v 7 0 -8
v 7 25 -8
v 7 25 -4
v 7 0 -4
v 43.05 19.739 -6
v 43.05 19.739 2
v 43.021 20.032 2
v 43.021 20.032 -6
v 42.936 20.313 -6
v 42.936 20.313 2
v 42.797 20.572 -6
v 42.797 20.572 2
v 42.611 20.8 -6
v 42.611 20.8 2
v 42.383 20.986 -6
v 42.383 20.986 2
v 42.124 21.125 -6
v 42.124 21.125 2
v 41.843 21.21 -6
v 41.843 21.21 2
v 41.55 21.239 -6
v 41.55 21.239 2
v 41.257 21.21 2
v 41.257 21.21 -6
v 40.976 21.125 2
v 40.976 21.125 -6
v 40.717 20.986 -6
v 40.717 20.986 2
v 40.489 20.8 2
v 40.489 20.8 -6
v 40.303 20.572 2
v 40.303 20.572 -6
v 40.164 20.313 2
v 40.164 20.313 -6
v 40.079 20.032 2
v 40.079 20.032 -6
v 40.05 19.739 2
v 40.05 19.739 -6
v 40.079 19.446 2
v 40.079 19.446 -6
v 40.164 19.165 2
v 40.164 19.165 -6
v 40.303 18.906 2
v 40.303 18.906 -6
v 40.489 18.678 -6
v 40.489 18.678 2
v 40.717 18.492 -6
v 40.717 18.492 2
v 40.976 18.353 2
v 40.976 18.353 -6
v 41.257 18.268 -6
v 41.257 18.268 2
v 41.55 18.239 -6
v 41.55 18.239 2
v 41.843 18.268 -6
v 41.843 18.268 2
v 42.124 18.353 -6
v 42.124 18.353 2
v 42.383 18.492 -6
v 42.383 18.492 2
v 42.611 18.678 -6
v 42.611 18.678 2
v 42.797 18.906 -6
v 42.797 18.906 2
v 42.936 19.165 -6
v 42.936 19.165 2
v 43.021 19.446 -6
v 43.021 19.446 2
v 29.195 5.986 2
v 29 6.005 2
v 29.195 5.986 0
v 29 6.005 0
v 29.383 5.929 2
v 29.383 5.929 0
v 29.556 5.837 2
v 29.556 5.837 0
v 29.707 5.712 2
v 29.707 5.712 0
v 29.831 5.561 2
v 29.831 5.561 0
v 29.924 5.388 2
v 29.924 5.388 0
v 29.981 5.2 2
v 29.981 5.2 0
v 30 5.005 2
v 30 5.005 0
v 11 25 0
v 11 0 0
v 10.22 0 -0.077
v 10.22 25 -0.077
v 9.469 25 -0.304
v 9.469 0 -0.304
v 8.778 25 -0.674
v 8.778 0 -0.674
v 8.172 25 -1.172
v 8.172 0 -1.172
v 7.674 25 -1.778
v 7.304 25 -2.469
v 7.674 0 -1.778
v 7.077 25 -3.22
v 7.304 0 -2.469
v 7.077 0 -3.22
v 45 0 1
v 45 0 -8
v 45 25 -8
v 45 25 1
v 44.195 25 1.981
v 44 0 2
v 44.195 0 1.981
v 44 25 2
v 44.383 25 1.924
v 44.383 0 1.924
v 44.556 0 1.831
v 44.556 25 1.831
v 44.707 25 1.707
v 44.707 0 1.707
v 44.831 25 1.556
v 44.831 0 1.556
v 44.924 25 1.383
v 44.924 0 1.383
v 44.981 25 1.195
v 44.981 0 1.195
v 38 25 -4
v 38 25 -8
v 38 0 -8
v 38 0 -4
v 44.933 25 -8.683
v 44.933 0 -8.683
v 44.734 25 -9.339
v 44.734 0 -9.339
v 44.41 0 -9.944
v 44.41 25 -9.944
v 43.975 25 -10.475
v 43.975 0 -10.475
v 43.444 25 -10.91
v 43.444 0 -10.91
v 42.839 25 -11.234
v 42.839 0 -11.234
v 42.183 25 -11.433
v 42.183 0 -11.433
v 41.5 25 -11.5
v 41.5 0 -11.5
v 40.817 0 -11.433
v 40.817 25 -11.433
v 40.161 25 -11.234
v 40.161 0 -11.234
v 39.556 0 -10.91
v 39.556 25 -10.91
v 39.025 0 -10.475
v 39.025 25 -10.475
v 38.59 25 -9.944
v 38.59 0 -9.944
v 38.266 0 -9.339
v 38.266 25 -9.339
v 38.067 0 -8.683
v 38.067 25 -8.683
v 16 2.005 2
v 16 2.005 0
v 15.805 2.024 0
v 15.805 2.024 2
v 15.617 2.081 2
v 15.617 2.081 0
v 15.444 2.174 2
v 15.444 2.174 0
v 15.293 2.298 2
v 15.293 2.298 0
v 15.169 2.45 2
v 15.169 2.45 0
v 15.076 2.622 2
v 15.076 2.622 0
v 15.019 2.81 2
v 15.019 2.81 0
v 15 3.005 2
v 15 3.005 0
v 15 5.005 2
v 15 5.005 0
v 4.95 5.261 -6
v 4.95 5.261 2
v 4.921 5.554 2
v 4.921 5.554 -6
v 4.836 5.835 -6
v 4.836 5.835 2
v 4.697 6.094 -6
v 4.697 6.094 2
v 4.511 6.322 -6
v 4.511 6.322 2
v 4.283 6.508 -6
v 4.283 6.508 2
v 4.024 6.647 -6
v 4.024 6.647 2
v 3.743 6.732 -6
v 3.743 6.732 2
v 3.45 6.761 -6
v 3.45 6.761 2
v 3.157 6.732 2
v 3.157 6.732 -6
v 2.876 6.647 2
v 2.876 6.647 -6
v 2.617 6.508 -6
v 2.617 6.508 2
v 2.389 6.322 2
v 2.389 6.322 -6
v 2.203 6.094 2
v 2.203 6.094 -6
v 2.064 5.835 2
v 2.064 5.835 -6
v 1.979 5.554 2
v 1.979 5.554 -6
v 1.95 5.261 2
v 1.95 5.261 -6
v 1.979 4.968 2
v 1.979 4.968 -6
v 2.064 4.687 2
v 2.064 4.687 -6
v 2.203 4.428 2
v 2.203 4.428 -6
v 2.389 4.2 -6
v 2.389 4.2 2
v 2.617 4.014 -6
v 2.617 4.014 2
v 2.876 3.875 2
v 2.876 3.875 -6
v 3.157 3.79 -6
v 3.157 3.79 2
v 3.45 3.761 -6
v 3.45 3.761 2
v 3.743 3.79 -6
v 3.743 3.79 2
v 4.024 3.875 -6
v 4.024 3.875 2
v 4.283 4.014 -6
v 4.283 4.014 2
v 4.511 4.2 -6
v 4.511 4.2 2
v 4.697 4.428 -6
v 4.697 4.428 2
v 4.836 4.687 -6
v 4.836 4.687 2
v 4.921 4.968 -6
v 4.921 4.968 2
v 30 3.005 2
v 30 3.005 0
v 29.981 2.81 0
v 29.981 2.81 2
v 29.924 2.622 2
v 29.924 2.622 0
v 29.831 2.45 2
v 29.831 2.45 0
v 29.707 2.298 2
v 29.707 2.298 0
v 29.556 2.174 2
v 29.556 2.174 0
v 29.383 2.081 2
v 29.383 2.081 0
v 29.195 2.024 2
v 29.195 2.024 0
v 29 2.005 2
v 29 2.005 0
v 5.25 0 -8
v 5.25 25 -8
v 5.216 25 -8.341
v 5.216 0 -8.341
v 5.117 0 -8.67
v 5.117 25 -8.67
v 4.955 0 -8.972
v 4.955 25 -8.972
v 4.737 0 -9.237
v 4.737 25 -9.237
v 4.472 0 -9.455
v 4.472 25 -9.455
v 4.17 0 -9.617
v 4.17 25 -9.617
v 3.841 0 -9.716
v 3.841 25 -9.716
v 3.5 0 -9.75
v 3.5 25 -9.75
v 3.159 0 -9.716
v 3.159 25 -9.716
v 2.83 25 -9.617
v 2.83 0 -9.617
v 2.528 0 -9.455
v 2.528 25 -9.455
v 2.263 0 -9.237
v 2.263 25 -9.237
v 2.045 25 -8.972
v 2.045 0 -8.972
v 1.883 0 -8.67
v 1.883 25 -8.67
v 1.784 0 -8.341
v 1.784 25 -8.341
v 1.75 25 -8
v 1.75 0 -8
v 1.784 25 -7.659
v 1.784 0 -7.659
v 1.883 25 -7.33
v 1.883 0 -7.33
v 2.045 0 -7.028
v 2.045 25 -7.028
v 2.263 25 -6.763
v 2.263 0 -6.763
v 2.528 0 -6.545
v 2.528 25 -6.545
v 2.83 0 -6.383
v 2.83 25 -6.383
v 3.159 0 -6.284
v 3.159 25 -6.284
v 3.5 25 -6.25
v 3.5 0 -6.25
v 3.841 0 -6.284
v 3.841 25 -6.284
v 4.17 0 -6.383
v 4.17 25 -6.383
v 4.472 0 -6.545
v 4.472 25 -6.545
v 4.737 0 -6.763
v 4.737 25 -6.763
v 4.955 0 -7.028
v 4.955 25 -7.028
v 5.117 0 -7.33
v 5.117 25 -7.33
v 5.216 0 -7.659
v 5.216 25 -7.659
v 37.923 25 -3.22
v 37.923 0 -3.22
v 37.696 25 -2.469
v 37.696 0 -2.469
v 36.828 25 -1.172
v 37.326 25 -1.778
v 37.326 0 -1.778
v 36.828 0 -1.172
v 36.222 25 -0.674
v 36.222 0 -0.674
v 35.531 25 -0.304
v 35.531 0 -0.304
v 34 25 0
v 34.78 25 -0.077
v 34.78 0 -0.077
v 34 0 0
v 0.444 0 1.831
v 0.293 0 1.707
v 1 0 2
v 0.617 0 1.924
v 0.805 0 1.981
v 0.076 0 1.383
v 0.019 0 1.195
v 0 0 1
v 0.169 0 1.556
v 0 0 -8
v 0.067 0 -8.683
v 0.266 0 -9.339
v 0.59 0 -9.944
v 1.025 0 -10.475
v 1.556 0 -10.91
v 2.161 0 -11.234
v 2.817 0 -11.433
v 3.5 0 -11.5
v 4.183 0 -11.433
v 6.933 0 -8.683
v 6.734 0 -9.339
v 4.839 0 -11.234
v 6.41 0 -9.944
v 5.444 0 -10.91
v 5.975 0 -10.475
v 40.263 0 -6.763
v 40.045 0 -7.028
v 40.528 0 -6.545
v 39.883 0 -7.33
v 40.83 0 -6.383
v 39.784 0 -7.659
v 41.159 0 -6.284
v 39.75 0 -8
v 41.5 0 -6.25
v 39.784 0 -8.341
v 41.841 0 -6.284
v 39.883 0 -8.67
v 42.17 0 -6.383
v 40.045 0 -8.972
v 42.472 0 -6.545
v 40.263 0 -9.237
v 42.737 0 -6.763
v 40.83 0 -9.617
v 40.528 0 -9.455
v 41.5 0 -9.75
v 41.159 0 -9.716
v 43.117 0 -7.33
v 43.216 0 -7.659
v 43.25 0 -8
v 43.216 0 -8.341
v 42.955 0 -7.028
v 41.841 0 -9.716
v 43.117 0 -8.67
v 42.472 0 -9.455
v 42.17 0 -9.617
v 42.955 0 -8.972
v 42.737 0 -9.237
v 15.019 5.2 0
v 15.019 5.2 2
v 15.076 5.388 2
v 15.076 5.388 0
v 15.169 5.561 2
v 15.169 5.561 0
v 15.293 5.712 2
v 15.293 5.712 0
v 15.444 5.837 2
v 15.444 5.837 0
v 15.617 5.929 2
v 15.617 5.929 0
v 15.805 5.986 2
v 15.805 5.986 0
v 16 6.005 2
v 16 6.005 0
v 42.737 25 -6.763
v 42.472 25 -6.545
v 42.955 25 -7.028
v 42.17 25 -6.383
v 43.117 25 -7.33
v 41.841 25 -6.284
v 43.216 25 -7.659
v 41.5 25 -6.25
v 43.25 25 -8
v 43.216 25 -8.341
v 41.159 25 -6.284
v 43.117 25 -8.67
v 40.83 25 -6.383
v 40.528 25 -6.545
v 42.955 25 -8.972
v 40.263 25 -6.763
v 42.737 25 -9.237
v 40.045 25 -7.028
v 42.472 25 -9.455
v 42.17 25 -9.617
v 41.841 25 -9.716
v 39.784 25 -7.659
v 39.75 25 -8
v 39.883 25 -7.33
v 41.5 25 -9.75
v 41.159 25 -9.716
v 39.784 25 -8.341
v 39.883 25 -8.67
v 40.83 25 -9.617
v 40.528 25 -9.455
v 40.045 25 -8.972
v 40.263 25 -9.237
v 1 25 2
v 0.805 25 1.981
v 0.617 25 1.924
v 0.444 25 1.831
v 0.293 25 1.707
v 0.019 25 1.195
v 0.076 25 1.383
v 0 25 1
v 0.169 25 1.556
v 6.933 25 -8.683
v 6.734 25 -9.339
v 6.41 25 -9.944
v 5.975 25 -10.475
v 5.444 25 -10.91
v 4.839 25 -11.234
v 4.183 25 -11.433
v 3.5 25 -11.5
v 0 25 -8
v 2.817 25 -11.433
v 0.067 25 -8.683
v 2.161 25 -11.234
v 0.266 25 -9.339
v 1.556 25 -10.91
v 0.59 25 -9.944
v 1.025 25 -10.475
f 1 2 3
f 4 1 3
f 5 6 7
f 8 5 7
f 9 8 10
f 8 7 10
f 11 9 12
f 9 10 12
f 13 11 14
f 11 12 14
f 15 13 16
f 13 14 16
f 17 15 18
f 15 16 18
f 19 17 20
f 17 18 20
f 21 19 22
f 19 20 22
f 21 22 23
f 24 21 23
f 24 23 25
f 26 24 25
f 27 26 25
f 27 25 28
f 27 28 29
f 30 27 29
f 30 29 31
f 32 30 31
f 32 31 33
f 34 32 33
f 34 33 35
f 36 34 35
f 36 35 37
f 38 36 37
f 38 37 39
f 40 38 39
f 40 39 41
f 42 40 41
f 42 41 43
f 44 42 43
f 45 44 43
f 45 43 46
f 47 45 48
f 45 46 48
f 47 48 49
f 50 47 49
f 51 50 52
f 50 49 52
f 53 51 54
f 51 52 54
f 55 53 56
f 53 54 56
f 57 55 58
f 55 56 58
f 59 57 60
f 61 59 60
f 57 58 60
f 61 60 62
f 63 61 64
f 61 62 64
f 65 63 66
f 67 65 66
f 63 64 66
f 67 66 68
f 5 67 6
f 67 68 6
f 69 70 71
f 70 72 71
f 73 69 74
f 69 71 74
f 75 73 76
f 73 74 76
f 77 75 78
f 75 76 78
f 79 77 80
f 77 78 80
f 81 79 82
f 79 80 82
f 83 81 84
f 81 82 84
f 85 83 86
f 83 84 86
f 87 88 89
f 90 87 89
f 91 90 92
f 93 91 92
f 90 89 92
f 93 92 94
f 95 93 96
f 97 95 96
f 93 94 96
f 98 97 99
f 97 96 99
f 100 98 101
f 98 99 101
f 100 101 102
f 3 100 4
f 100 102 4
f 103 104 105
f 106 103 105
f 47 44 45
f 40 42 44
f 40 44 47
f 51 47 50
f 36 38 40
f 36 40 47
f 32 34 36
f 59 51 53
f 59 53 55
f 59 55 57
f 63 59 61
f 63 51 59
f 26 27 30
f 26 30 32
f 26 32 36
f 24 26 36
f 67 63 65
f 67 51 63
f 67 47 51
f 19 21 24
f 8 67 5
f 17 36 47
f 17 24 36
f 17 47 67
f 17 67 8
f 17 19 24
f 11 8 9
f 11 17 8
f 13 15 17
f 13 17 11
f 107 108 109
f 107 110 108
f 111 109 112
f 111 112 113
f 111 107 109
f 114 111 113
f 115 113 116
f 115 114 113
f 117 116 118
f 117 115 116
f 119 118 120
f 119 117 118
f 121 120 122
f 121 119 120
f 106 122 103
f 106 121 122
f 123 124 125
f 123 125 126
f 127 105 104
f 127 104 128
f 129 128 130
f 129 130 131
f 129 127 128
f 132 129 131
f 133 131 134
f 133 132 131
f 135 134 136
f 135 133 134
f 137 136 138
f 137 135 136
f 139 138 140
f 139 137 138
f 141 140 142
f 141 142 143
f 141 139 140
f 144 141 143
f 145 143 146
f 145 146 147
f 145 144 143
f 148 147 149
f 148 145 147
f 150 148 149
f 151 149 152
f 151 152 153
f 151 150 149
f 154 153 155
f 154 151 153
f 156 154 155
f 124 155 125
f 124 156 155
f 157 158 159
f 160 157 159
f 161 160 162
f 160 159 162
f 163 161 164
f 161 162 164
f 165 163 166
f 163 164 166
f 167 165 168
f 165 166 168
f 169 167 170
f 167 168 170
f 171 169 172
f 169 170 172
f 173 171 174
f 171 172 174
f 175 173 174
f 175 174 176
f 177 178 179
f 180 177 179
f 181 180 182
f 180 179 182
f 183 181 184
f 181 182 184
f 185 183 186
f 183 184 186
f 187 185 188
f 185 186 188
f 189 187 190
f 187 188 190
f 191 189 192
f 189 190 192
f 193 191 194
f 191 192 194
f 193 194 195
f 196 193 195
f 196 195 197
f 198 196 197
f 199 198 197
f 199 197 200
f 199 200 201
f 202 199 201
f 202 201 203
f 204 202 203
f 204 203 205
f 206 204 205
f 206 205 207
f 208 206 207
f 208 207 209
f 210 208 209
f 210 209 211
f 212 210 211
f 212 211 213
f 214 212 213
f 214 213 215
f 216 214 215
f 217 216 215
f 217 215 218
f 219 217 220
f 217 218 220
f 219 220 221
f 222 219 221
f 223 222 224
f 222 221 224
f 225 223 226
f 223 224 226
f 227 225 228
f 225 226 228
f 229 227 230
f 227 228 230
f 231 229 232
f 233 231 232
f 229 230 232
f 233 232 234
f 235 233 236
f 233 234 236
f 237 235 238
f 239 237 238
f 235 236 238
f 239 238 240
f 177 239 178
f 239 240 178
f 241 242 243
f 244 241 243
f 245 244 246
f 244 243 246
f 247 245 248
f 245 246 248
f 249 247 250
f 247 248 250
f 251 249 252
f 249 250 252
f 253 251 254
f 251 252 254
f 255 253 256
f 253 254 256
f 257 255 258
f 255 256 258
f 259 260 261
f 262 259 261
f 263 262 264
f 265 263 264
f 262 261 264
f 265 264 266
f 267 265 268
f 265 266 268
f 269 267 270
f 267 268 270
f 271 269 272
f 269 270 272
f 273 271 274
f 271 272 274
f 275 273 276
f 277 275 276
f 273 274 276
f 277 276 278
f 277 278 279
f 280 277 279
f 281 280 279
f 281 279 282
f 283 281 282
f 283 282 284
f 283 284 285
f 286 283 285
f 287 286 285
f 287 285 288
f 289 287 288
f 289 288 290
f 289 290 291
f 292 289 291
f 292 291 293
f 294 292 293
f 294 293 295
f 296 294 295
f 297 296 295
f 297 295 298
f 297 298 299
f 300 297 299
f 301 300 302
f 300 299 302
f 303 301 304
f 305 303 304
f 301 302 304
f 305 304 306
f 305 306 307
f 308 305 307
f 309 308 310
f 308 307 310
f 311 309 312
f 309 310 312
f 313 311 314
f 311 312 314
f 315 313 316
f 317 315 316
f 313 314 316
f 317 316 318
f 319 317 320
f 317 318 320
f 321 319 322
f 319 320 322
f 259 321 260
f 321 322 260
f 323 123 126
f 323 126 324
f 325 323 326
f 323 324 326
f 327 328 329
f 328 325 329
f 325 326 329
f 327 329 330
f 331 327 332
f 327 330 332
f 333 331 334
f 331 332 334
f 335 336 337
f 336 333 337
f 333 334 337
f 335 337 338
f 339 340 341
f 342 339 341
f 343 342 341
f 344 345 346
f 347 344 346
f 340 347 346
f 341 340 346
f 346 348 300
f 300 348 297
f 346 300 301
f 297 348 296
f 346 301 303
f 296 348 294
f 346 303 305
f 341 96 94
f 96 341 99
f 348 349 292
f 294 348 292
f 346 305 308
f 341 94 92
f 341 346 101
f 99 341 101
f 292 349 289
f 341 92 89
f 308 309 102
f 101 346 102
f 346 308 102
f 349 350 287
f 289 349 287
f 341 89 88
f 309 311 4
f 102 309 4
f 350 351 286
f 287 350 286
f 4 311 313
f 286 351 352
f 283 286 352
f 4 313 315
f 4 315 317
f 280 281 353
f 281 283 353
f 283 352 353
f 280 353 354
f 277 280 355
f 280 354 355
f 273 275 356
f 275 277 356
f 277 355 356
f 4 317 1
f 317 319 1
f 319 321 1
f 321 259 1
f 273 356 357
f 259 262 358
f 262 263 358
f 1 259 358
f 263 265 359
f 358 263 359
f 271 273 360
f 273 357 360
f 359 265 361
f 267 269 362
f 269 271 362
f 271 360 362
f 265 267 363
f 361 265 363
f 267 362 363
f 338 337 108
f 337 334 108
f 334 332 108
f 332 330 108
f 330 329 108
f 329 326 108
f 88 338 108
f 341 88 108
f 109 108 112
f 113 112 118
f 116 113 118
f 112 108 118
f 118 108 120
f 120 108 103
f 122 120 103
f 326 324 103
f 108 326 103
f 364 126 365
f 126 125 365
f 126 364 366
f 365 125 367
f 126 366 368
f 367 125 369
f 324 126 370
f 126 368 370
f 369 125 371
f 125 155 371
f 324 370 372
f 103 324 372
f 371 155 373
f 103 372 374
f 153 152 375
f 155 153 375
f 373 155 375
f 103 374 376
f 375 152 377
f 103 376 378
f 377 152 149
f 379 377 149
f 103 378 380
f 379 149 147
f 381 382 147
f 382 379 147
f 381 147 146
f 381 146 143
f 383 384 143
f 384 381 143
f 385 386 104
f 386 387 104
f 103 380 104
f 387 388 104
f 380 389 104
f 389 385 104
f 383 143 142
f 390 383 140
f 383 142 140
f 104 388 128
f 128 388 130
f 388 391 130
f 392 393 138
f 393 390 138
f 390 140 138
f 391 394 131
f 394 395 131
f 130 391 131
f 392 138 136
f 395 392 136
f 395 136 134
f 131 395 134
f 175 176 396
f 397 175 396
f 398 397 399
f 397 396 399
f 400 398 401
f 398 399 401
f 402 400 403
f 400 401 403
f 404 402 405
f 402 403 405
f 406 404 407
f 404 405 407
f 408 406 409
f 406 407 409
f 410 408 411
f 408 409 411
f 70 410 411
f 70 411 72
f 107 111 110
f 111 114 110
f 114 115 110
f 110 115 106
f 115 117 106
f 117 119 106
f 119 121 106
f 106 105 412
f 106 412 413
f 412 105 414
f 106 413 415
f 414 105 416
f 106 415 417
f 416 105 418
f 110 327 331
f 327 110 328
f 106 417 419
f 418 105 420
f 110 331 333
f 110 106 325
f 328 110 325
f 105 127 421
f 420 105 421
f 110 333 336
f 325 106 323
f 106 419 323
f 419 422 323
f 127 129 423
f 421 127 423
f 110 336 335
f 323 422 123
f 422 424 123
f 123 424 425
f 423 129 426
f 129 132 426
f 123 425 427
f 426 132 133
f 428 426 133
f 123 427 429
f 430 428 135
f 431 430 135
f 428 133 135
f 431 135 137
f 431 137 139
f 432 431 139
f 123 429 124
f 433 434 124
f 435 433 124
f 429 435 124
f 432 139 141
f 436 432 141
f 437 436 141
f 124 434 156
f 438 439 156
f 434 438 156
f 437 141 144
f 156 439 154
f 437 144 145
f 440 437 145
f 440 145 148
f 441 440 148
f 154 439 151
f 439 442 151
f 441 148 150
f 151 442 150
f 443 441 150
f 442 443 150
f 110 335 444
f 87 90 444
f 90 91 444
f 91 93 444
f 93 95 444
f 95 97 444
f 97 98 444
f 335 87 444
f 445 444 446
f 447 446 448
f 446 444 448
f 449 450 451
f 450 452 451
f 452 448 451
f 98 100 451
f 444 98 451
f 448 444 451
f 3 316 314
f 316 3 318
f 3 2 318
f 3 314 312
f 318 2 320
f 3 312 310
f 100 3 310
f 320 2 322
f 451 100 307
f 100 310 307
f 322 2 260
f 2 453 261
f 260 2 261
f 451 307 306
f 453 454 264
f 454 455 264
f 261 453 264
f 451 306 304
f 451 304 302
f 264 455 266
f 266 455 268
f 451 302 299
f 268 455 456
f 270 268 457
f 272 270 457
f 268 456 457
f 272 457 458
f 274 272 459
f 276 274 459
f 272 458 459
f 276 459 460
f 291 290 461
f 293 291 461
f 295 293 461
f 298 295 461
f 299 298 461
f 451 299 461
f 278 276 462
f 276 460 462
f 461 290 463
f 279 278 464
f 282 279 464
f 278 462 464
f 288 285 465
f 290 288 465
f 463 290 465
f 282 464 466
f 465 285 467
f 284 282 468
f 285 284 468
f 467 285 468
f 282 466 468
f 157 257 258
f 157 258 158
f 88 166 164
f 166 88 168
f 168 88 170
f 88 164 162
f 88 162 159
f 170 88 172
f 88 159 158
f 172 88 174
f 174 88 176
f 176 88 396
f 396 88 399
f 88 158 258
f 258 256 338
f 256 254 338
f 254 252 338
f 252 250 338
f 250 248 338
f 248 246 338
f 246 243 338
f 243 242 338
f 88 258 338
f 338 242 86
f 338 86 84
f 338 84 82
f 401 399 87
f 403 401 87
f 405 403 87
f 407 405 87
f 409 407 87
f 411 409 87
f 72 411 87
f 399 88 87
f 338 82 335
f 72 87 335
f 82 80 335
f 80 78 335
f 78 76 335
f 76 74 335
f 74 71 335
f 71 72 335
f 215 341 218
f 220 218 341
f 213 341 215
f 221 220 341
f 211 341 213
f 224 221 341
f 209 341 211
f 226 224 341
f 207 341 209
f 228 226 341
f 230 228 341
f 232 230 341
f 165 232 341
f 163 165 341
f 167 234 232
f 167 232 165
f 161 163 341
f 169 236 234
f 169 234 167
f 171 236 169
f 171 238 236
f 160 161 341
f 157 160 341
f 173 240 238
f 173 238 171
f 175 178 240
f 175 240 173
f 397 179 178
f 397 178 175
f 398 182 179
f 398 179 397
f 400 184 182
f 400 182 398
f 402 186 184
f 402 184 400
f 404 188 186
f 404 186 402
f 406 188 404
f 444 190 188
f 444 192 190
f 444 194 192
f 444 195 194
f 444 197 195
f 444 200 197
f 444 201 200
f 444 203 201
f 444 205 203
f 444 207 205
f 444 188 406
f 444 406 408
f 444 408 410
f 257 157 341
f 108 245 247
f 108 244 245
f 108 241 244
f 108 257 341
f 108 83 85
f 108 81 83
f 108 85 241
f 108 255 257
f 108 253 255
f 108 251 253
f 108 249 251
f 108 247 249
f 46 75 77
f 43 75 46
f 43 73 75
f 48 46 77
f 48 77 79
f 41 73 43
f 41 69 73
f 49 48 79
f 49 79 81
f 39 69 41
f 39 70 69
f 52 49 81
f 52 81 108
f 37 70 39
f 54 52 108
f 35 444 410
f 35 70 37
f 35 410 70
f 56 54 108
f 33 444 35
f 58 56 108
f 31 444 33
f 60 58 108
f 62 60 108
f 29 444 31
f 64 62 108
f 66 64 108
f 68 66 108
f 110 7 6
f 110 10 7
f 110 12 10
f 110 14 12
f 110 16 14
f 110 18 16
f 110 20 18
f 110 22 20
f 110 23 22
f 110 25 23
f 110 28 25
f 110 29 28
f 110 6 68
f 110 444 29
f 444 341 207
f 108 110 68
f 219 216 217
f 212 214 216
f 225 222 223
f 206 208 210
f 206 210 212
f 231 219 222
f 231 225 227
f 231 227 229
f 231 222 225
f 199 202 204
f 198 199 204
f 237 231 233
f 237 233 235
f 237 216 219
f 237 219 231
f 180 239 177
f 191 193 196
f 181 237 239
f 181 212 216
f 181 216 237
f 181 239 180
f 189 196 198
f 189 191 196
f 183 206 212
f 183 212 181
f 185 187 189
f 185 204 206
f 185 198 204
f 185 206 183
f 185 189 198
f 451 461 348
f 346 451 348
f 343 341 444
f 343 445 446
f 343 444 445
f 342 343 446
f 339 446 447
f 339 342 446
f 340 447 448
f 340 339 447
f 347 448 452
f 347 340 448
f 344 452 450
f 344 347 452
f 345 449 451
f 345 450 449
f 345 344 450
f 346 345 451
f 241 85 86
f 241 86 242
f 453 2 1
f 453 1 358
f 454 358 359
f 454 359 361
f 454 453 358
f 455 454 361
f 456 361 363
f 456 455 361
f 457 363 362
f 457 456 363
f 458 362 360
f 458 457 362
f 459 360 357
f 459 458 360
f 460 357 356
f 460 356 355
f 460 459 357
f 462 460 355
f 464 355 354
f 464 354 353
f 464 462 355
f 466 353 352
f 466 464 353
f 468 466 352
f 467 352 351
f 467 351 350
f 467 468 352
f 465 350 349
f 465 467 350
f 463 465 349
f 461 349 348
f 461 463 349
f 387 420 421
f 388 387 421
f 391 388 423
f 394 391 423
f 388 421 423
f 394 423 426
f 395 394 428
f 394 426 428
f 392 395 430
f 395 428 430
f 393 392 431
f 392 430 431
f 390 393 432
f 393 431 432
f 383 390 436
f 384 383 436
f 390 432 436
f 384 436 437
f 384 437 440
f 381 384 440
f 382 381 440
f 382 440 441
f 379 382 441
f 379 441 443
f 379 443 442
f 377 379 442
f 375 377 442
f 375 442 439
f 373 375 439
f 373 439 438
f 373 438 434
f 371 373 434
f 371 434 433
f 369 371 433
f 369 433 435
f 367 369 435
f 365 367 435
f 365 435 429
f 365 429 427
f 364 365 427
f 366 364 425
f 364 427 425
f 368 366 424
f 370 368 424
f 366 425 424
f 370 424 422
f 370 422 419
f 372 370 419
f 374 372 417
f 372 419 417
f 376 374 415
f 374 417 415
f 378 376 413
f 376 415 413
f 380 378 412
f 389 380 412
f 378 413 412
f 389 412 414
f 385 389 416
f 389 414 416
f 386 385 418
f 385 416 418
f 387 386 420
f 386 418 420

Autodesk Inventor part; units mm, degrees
ref_plane "YZ Plane" through (0, 0, 0) normal (1, 0, 0) x (0, 1, 0)
ref_plane "XZ Plane" through (0, 0, 0) normal (0, 1, 0) x (-1, 0, 0)
ref_plane "XY Plane" through (0, 0, 0) normal (0, 0, 1) x (1, 0, 0)
sketch "Skizze1" plane through (0, 0, 0) normal (0, 0, 1) x (1, 0, 0)
  line L0 (0, 0) -> (45, 0)
  line L1 (45, 0) -> (45, 25)
  line L2 (45, 25) -> (0, 25)
  line L3 (0, 25) -> (0, 0)
  dimension "d5" = 45
  dimension "d6" = 25
extrude "Extrusion1" add sketch "Skizze1" along normal blind 2
sketch "Skizze3" plane through (0, 25, 0) normal (0, 1, 0) x (1, 0, 0)
  circle A0 centre (3.5, 8) radius 1.75
  circle A1 centre (41.5, 8) radius 1.75
  line L0 (3.5, 8) -> (41.5, 8) construction
  line L1 (0, 0) -> (45, 0) construction
  line L2 (22.5, 0) -> (22.5, 8) construction
  line L3 (0, 0) -> (7, 0)
  line L4 (45, 0) -> (38, 0)
  line L5 (0, 0) -> (0, 8)
  line L6 (7, 8) -> (7, 0)
  line L7 (38, 8) -> (38, 0)
  line L8 (45, 0) -> (45, 8)
  arc A2 (7, 8) -> (0, 8) centre (3.5, 8) ccw
  arc A3 (45, 8) -> (38, 8) centre (41.5, 8) ccw
  dimension "d2" = 38
  dimension "d3" = 3.5
  dimension "d4" = 8
extrude "Extrusion2" add sketch "Skizze3" against normal up to surface (25 mm away)
sketch "Skizze4" plane through (0, 0, 2) normal (0, 0, 1) x (1, 0, 0)
  line L0 (3.45, 5.261) -> (41.55, 5.261) construction
  line L1 (41.55, 5.261) -> (41.55, 19.739) construction
  line L2 (41.55, 19.739) -> (3.45, 19.739) construction
  line L3 (3.45, 19.739) -> (3.45, 5.261) construction
  line L4 (45, 25) -> (0, 25) construction
  line L5 (22.5, 25) -> (22.5, 0) construction
  line L6 (0, 0) -> (45, 0) construction
  line L7 (0, 25) -> (0, 0) construction
  line L8 (0, 12.5) -> (45, 12.5) construction
  line L9 (45, 0) -> (45, 25) construction
  circle A0 centre (41.55, 19.739) radius 1.5
  circle A1 centre (3.45, 5.261) radius 1.5
  point P0 (22.5, 19.739)
  point P1 (41.55, 12.5)
  dimension "d12" = 38.1
  dimension "d13" = 14.478
  dimension "d14" = 3
extrude "Extrusion3" cut sketch "Skizze4" against normal blind 8
sketch "Skizze5" plane through (0, 0, 2) normal (0, 0, 1) x (1, 0, 0)
  line L0 (44.09, 22.4949) -> (0.91, 22.4949) construction
  line L1 (0.91, 22.4949) -> (0.91, 2.5051) construction
  line L2 (0.91, 2.5051) -> (44.09, 2.5051) construction
  line L3 (44.09, 2.5051) -> (44.09, 22.4949) construction
  line L4 (45, 25) -> (0, 25) construction
  line L5 (22.5, 25) -> (22.5, 0) construction
  line L6 (0, 0) -> (45, 0) construction
  line L7 (45, 0) -> (45, 25) construction
  line L8 (45, 12.5) -> (0, 12.5) construction
  line L9 (0, 25) -> (0, 0) construction
  line L10 (15, 6.0051) -> (30, 6.0051)
  line L11 (30, 6.0051) -> (30, 2.0051)
  line L12 (30, 2.0051) -> (15, 2.0051)
  line L13 (15, 2.0051) -> (15, 6.0051)
  point P0 (0.91, 12.5)
  point P1 (22.5, 6.0051)
  dimension "d17" = 43.18
  dimension "d18" = 19.9898
  dimension "d19" = 15
  dimension "d20" = 4
  dimension "d27" = 0.5
extrude "Extrusion4" cut sketch "Skizze5" against normal up to next
fillet "Rundung1" radius 1 4 edges at (15, 6.0051, 1) (30, 6.0051, 1) (30, 2.0051, 1) (15, 2.0051, 1)
fillet "Rundung2" radius 4 2 edges at (7, 12.5, 0) (38, 12.5, 0)
fillet "Rundung3" radius 1 2 edges at (0, 12.5, 2) (45, 12.5, 2)
properties part number "US Halterung hinten" material "ABS-Kunststoff"
